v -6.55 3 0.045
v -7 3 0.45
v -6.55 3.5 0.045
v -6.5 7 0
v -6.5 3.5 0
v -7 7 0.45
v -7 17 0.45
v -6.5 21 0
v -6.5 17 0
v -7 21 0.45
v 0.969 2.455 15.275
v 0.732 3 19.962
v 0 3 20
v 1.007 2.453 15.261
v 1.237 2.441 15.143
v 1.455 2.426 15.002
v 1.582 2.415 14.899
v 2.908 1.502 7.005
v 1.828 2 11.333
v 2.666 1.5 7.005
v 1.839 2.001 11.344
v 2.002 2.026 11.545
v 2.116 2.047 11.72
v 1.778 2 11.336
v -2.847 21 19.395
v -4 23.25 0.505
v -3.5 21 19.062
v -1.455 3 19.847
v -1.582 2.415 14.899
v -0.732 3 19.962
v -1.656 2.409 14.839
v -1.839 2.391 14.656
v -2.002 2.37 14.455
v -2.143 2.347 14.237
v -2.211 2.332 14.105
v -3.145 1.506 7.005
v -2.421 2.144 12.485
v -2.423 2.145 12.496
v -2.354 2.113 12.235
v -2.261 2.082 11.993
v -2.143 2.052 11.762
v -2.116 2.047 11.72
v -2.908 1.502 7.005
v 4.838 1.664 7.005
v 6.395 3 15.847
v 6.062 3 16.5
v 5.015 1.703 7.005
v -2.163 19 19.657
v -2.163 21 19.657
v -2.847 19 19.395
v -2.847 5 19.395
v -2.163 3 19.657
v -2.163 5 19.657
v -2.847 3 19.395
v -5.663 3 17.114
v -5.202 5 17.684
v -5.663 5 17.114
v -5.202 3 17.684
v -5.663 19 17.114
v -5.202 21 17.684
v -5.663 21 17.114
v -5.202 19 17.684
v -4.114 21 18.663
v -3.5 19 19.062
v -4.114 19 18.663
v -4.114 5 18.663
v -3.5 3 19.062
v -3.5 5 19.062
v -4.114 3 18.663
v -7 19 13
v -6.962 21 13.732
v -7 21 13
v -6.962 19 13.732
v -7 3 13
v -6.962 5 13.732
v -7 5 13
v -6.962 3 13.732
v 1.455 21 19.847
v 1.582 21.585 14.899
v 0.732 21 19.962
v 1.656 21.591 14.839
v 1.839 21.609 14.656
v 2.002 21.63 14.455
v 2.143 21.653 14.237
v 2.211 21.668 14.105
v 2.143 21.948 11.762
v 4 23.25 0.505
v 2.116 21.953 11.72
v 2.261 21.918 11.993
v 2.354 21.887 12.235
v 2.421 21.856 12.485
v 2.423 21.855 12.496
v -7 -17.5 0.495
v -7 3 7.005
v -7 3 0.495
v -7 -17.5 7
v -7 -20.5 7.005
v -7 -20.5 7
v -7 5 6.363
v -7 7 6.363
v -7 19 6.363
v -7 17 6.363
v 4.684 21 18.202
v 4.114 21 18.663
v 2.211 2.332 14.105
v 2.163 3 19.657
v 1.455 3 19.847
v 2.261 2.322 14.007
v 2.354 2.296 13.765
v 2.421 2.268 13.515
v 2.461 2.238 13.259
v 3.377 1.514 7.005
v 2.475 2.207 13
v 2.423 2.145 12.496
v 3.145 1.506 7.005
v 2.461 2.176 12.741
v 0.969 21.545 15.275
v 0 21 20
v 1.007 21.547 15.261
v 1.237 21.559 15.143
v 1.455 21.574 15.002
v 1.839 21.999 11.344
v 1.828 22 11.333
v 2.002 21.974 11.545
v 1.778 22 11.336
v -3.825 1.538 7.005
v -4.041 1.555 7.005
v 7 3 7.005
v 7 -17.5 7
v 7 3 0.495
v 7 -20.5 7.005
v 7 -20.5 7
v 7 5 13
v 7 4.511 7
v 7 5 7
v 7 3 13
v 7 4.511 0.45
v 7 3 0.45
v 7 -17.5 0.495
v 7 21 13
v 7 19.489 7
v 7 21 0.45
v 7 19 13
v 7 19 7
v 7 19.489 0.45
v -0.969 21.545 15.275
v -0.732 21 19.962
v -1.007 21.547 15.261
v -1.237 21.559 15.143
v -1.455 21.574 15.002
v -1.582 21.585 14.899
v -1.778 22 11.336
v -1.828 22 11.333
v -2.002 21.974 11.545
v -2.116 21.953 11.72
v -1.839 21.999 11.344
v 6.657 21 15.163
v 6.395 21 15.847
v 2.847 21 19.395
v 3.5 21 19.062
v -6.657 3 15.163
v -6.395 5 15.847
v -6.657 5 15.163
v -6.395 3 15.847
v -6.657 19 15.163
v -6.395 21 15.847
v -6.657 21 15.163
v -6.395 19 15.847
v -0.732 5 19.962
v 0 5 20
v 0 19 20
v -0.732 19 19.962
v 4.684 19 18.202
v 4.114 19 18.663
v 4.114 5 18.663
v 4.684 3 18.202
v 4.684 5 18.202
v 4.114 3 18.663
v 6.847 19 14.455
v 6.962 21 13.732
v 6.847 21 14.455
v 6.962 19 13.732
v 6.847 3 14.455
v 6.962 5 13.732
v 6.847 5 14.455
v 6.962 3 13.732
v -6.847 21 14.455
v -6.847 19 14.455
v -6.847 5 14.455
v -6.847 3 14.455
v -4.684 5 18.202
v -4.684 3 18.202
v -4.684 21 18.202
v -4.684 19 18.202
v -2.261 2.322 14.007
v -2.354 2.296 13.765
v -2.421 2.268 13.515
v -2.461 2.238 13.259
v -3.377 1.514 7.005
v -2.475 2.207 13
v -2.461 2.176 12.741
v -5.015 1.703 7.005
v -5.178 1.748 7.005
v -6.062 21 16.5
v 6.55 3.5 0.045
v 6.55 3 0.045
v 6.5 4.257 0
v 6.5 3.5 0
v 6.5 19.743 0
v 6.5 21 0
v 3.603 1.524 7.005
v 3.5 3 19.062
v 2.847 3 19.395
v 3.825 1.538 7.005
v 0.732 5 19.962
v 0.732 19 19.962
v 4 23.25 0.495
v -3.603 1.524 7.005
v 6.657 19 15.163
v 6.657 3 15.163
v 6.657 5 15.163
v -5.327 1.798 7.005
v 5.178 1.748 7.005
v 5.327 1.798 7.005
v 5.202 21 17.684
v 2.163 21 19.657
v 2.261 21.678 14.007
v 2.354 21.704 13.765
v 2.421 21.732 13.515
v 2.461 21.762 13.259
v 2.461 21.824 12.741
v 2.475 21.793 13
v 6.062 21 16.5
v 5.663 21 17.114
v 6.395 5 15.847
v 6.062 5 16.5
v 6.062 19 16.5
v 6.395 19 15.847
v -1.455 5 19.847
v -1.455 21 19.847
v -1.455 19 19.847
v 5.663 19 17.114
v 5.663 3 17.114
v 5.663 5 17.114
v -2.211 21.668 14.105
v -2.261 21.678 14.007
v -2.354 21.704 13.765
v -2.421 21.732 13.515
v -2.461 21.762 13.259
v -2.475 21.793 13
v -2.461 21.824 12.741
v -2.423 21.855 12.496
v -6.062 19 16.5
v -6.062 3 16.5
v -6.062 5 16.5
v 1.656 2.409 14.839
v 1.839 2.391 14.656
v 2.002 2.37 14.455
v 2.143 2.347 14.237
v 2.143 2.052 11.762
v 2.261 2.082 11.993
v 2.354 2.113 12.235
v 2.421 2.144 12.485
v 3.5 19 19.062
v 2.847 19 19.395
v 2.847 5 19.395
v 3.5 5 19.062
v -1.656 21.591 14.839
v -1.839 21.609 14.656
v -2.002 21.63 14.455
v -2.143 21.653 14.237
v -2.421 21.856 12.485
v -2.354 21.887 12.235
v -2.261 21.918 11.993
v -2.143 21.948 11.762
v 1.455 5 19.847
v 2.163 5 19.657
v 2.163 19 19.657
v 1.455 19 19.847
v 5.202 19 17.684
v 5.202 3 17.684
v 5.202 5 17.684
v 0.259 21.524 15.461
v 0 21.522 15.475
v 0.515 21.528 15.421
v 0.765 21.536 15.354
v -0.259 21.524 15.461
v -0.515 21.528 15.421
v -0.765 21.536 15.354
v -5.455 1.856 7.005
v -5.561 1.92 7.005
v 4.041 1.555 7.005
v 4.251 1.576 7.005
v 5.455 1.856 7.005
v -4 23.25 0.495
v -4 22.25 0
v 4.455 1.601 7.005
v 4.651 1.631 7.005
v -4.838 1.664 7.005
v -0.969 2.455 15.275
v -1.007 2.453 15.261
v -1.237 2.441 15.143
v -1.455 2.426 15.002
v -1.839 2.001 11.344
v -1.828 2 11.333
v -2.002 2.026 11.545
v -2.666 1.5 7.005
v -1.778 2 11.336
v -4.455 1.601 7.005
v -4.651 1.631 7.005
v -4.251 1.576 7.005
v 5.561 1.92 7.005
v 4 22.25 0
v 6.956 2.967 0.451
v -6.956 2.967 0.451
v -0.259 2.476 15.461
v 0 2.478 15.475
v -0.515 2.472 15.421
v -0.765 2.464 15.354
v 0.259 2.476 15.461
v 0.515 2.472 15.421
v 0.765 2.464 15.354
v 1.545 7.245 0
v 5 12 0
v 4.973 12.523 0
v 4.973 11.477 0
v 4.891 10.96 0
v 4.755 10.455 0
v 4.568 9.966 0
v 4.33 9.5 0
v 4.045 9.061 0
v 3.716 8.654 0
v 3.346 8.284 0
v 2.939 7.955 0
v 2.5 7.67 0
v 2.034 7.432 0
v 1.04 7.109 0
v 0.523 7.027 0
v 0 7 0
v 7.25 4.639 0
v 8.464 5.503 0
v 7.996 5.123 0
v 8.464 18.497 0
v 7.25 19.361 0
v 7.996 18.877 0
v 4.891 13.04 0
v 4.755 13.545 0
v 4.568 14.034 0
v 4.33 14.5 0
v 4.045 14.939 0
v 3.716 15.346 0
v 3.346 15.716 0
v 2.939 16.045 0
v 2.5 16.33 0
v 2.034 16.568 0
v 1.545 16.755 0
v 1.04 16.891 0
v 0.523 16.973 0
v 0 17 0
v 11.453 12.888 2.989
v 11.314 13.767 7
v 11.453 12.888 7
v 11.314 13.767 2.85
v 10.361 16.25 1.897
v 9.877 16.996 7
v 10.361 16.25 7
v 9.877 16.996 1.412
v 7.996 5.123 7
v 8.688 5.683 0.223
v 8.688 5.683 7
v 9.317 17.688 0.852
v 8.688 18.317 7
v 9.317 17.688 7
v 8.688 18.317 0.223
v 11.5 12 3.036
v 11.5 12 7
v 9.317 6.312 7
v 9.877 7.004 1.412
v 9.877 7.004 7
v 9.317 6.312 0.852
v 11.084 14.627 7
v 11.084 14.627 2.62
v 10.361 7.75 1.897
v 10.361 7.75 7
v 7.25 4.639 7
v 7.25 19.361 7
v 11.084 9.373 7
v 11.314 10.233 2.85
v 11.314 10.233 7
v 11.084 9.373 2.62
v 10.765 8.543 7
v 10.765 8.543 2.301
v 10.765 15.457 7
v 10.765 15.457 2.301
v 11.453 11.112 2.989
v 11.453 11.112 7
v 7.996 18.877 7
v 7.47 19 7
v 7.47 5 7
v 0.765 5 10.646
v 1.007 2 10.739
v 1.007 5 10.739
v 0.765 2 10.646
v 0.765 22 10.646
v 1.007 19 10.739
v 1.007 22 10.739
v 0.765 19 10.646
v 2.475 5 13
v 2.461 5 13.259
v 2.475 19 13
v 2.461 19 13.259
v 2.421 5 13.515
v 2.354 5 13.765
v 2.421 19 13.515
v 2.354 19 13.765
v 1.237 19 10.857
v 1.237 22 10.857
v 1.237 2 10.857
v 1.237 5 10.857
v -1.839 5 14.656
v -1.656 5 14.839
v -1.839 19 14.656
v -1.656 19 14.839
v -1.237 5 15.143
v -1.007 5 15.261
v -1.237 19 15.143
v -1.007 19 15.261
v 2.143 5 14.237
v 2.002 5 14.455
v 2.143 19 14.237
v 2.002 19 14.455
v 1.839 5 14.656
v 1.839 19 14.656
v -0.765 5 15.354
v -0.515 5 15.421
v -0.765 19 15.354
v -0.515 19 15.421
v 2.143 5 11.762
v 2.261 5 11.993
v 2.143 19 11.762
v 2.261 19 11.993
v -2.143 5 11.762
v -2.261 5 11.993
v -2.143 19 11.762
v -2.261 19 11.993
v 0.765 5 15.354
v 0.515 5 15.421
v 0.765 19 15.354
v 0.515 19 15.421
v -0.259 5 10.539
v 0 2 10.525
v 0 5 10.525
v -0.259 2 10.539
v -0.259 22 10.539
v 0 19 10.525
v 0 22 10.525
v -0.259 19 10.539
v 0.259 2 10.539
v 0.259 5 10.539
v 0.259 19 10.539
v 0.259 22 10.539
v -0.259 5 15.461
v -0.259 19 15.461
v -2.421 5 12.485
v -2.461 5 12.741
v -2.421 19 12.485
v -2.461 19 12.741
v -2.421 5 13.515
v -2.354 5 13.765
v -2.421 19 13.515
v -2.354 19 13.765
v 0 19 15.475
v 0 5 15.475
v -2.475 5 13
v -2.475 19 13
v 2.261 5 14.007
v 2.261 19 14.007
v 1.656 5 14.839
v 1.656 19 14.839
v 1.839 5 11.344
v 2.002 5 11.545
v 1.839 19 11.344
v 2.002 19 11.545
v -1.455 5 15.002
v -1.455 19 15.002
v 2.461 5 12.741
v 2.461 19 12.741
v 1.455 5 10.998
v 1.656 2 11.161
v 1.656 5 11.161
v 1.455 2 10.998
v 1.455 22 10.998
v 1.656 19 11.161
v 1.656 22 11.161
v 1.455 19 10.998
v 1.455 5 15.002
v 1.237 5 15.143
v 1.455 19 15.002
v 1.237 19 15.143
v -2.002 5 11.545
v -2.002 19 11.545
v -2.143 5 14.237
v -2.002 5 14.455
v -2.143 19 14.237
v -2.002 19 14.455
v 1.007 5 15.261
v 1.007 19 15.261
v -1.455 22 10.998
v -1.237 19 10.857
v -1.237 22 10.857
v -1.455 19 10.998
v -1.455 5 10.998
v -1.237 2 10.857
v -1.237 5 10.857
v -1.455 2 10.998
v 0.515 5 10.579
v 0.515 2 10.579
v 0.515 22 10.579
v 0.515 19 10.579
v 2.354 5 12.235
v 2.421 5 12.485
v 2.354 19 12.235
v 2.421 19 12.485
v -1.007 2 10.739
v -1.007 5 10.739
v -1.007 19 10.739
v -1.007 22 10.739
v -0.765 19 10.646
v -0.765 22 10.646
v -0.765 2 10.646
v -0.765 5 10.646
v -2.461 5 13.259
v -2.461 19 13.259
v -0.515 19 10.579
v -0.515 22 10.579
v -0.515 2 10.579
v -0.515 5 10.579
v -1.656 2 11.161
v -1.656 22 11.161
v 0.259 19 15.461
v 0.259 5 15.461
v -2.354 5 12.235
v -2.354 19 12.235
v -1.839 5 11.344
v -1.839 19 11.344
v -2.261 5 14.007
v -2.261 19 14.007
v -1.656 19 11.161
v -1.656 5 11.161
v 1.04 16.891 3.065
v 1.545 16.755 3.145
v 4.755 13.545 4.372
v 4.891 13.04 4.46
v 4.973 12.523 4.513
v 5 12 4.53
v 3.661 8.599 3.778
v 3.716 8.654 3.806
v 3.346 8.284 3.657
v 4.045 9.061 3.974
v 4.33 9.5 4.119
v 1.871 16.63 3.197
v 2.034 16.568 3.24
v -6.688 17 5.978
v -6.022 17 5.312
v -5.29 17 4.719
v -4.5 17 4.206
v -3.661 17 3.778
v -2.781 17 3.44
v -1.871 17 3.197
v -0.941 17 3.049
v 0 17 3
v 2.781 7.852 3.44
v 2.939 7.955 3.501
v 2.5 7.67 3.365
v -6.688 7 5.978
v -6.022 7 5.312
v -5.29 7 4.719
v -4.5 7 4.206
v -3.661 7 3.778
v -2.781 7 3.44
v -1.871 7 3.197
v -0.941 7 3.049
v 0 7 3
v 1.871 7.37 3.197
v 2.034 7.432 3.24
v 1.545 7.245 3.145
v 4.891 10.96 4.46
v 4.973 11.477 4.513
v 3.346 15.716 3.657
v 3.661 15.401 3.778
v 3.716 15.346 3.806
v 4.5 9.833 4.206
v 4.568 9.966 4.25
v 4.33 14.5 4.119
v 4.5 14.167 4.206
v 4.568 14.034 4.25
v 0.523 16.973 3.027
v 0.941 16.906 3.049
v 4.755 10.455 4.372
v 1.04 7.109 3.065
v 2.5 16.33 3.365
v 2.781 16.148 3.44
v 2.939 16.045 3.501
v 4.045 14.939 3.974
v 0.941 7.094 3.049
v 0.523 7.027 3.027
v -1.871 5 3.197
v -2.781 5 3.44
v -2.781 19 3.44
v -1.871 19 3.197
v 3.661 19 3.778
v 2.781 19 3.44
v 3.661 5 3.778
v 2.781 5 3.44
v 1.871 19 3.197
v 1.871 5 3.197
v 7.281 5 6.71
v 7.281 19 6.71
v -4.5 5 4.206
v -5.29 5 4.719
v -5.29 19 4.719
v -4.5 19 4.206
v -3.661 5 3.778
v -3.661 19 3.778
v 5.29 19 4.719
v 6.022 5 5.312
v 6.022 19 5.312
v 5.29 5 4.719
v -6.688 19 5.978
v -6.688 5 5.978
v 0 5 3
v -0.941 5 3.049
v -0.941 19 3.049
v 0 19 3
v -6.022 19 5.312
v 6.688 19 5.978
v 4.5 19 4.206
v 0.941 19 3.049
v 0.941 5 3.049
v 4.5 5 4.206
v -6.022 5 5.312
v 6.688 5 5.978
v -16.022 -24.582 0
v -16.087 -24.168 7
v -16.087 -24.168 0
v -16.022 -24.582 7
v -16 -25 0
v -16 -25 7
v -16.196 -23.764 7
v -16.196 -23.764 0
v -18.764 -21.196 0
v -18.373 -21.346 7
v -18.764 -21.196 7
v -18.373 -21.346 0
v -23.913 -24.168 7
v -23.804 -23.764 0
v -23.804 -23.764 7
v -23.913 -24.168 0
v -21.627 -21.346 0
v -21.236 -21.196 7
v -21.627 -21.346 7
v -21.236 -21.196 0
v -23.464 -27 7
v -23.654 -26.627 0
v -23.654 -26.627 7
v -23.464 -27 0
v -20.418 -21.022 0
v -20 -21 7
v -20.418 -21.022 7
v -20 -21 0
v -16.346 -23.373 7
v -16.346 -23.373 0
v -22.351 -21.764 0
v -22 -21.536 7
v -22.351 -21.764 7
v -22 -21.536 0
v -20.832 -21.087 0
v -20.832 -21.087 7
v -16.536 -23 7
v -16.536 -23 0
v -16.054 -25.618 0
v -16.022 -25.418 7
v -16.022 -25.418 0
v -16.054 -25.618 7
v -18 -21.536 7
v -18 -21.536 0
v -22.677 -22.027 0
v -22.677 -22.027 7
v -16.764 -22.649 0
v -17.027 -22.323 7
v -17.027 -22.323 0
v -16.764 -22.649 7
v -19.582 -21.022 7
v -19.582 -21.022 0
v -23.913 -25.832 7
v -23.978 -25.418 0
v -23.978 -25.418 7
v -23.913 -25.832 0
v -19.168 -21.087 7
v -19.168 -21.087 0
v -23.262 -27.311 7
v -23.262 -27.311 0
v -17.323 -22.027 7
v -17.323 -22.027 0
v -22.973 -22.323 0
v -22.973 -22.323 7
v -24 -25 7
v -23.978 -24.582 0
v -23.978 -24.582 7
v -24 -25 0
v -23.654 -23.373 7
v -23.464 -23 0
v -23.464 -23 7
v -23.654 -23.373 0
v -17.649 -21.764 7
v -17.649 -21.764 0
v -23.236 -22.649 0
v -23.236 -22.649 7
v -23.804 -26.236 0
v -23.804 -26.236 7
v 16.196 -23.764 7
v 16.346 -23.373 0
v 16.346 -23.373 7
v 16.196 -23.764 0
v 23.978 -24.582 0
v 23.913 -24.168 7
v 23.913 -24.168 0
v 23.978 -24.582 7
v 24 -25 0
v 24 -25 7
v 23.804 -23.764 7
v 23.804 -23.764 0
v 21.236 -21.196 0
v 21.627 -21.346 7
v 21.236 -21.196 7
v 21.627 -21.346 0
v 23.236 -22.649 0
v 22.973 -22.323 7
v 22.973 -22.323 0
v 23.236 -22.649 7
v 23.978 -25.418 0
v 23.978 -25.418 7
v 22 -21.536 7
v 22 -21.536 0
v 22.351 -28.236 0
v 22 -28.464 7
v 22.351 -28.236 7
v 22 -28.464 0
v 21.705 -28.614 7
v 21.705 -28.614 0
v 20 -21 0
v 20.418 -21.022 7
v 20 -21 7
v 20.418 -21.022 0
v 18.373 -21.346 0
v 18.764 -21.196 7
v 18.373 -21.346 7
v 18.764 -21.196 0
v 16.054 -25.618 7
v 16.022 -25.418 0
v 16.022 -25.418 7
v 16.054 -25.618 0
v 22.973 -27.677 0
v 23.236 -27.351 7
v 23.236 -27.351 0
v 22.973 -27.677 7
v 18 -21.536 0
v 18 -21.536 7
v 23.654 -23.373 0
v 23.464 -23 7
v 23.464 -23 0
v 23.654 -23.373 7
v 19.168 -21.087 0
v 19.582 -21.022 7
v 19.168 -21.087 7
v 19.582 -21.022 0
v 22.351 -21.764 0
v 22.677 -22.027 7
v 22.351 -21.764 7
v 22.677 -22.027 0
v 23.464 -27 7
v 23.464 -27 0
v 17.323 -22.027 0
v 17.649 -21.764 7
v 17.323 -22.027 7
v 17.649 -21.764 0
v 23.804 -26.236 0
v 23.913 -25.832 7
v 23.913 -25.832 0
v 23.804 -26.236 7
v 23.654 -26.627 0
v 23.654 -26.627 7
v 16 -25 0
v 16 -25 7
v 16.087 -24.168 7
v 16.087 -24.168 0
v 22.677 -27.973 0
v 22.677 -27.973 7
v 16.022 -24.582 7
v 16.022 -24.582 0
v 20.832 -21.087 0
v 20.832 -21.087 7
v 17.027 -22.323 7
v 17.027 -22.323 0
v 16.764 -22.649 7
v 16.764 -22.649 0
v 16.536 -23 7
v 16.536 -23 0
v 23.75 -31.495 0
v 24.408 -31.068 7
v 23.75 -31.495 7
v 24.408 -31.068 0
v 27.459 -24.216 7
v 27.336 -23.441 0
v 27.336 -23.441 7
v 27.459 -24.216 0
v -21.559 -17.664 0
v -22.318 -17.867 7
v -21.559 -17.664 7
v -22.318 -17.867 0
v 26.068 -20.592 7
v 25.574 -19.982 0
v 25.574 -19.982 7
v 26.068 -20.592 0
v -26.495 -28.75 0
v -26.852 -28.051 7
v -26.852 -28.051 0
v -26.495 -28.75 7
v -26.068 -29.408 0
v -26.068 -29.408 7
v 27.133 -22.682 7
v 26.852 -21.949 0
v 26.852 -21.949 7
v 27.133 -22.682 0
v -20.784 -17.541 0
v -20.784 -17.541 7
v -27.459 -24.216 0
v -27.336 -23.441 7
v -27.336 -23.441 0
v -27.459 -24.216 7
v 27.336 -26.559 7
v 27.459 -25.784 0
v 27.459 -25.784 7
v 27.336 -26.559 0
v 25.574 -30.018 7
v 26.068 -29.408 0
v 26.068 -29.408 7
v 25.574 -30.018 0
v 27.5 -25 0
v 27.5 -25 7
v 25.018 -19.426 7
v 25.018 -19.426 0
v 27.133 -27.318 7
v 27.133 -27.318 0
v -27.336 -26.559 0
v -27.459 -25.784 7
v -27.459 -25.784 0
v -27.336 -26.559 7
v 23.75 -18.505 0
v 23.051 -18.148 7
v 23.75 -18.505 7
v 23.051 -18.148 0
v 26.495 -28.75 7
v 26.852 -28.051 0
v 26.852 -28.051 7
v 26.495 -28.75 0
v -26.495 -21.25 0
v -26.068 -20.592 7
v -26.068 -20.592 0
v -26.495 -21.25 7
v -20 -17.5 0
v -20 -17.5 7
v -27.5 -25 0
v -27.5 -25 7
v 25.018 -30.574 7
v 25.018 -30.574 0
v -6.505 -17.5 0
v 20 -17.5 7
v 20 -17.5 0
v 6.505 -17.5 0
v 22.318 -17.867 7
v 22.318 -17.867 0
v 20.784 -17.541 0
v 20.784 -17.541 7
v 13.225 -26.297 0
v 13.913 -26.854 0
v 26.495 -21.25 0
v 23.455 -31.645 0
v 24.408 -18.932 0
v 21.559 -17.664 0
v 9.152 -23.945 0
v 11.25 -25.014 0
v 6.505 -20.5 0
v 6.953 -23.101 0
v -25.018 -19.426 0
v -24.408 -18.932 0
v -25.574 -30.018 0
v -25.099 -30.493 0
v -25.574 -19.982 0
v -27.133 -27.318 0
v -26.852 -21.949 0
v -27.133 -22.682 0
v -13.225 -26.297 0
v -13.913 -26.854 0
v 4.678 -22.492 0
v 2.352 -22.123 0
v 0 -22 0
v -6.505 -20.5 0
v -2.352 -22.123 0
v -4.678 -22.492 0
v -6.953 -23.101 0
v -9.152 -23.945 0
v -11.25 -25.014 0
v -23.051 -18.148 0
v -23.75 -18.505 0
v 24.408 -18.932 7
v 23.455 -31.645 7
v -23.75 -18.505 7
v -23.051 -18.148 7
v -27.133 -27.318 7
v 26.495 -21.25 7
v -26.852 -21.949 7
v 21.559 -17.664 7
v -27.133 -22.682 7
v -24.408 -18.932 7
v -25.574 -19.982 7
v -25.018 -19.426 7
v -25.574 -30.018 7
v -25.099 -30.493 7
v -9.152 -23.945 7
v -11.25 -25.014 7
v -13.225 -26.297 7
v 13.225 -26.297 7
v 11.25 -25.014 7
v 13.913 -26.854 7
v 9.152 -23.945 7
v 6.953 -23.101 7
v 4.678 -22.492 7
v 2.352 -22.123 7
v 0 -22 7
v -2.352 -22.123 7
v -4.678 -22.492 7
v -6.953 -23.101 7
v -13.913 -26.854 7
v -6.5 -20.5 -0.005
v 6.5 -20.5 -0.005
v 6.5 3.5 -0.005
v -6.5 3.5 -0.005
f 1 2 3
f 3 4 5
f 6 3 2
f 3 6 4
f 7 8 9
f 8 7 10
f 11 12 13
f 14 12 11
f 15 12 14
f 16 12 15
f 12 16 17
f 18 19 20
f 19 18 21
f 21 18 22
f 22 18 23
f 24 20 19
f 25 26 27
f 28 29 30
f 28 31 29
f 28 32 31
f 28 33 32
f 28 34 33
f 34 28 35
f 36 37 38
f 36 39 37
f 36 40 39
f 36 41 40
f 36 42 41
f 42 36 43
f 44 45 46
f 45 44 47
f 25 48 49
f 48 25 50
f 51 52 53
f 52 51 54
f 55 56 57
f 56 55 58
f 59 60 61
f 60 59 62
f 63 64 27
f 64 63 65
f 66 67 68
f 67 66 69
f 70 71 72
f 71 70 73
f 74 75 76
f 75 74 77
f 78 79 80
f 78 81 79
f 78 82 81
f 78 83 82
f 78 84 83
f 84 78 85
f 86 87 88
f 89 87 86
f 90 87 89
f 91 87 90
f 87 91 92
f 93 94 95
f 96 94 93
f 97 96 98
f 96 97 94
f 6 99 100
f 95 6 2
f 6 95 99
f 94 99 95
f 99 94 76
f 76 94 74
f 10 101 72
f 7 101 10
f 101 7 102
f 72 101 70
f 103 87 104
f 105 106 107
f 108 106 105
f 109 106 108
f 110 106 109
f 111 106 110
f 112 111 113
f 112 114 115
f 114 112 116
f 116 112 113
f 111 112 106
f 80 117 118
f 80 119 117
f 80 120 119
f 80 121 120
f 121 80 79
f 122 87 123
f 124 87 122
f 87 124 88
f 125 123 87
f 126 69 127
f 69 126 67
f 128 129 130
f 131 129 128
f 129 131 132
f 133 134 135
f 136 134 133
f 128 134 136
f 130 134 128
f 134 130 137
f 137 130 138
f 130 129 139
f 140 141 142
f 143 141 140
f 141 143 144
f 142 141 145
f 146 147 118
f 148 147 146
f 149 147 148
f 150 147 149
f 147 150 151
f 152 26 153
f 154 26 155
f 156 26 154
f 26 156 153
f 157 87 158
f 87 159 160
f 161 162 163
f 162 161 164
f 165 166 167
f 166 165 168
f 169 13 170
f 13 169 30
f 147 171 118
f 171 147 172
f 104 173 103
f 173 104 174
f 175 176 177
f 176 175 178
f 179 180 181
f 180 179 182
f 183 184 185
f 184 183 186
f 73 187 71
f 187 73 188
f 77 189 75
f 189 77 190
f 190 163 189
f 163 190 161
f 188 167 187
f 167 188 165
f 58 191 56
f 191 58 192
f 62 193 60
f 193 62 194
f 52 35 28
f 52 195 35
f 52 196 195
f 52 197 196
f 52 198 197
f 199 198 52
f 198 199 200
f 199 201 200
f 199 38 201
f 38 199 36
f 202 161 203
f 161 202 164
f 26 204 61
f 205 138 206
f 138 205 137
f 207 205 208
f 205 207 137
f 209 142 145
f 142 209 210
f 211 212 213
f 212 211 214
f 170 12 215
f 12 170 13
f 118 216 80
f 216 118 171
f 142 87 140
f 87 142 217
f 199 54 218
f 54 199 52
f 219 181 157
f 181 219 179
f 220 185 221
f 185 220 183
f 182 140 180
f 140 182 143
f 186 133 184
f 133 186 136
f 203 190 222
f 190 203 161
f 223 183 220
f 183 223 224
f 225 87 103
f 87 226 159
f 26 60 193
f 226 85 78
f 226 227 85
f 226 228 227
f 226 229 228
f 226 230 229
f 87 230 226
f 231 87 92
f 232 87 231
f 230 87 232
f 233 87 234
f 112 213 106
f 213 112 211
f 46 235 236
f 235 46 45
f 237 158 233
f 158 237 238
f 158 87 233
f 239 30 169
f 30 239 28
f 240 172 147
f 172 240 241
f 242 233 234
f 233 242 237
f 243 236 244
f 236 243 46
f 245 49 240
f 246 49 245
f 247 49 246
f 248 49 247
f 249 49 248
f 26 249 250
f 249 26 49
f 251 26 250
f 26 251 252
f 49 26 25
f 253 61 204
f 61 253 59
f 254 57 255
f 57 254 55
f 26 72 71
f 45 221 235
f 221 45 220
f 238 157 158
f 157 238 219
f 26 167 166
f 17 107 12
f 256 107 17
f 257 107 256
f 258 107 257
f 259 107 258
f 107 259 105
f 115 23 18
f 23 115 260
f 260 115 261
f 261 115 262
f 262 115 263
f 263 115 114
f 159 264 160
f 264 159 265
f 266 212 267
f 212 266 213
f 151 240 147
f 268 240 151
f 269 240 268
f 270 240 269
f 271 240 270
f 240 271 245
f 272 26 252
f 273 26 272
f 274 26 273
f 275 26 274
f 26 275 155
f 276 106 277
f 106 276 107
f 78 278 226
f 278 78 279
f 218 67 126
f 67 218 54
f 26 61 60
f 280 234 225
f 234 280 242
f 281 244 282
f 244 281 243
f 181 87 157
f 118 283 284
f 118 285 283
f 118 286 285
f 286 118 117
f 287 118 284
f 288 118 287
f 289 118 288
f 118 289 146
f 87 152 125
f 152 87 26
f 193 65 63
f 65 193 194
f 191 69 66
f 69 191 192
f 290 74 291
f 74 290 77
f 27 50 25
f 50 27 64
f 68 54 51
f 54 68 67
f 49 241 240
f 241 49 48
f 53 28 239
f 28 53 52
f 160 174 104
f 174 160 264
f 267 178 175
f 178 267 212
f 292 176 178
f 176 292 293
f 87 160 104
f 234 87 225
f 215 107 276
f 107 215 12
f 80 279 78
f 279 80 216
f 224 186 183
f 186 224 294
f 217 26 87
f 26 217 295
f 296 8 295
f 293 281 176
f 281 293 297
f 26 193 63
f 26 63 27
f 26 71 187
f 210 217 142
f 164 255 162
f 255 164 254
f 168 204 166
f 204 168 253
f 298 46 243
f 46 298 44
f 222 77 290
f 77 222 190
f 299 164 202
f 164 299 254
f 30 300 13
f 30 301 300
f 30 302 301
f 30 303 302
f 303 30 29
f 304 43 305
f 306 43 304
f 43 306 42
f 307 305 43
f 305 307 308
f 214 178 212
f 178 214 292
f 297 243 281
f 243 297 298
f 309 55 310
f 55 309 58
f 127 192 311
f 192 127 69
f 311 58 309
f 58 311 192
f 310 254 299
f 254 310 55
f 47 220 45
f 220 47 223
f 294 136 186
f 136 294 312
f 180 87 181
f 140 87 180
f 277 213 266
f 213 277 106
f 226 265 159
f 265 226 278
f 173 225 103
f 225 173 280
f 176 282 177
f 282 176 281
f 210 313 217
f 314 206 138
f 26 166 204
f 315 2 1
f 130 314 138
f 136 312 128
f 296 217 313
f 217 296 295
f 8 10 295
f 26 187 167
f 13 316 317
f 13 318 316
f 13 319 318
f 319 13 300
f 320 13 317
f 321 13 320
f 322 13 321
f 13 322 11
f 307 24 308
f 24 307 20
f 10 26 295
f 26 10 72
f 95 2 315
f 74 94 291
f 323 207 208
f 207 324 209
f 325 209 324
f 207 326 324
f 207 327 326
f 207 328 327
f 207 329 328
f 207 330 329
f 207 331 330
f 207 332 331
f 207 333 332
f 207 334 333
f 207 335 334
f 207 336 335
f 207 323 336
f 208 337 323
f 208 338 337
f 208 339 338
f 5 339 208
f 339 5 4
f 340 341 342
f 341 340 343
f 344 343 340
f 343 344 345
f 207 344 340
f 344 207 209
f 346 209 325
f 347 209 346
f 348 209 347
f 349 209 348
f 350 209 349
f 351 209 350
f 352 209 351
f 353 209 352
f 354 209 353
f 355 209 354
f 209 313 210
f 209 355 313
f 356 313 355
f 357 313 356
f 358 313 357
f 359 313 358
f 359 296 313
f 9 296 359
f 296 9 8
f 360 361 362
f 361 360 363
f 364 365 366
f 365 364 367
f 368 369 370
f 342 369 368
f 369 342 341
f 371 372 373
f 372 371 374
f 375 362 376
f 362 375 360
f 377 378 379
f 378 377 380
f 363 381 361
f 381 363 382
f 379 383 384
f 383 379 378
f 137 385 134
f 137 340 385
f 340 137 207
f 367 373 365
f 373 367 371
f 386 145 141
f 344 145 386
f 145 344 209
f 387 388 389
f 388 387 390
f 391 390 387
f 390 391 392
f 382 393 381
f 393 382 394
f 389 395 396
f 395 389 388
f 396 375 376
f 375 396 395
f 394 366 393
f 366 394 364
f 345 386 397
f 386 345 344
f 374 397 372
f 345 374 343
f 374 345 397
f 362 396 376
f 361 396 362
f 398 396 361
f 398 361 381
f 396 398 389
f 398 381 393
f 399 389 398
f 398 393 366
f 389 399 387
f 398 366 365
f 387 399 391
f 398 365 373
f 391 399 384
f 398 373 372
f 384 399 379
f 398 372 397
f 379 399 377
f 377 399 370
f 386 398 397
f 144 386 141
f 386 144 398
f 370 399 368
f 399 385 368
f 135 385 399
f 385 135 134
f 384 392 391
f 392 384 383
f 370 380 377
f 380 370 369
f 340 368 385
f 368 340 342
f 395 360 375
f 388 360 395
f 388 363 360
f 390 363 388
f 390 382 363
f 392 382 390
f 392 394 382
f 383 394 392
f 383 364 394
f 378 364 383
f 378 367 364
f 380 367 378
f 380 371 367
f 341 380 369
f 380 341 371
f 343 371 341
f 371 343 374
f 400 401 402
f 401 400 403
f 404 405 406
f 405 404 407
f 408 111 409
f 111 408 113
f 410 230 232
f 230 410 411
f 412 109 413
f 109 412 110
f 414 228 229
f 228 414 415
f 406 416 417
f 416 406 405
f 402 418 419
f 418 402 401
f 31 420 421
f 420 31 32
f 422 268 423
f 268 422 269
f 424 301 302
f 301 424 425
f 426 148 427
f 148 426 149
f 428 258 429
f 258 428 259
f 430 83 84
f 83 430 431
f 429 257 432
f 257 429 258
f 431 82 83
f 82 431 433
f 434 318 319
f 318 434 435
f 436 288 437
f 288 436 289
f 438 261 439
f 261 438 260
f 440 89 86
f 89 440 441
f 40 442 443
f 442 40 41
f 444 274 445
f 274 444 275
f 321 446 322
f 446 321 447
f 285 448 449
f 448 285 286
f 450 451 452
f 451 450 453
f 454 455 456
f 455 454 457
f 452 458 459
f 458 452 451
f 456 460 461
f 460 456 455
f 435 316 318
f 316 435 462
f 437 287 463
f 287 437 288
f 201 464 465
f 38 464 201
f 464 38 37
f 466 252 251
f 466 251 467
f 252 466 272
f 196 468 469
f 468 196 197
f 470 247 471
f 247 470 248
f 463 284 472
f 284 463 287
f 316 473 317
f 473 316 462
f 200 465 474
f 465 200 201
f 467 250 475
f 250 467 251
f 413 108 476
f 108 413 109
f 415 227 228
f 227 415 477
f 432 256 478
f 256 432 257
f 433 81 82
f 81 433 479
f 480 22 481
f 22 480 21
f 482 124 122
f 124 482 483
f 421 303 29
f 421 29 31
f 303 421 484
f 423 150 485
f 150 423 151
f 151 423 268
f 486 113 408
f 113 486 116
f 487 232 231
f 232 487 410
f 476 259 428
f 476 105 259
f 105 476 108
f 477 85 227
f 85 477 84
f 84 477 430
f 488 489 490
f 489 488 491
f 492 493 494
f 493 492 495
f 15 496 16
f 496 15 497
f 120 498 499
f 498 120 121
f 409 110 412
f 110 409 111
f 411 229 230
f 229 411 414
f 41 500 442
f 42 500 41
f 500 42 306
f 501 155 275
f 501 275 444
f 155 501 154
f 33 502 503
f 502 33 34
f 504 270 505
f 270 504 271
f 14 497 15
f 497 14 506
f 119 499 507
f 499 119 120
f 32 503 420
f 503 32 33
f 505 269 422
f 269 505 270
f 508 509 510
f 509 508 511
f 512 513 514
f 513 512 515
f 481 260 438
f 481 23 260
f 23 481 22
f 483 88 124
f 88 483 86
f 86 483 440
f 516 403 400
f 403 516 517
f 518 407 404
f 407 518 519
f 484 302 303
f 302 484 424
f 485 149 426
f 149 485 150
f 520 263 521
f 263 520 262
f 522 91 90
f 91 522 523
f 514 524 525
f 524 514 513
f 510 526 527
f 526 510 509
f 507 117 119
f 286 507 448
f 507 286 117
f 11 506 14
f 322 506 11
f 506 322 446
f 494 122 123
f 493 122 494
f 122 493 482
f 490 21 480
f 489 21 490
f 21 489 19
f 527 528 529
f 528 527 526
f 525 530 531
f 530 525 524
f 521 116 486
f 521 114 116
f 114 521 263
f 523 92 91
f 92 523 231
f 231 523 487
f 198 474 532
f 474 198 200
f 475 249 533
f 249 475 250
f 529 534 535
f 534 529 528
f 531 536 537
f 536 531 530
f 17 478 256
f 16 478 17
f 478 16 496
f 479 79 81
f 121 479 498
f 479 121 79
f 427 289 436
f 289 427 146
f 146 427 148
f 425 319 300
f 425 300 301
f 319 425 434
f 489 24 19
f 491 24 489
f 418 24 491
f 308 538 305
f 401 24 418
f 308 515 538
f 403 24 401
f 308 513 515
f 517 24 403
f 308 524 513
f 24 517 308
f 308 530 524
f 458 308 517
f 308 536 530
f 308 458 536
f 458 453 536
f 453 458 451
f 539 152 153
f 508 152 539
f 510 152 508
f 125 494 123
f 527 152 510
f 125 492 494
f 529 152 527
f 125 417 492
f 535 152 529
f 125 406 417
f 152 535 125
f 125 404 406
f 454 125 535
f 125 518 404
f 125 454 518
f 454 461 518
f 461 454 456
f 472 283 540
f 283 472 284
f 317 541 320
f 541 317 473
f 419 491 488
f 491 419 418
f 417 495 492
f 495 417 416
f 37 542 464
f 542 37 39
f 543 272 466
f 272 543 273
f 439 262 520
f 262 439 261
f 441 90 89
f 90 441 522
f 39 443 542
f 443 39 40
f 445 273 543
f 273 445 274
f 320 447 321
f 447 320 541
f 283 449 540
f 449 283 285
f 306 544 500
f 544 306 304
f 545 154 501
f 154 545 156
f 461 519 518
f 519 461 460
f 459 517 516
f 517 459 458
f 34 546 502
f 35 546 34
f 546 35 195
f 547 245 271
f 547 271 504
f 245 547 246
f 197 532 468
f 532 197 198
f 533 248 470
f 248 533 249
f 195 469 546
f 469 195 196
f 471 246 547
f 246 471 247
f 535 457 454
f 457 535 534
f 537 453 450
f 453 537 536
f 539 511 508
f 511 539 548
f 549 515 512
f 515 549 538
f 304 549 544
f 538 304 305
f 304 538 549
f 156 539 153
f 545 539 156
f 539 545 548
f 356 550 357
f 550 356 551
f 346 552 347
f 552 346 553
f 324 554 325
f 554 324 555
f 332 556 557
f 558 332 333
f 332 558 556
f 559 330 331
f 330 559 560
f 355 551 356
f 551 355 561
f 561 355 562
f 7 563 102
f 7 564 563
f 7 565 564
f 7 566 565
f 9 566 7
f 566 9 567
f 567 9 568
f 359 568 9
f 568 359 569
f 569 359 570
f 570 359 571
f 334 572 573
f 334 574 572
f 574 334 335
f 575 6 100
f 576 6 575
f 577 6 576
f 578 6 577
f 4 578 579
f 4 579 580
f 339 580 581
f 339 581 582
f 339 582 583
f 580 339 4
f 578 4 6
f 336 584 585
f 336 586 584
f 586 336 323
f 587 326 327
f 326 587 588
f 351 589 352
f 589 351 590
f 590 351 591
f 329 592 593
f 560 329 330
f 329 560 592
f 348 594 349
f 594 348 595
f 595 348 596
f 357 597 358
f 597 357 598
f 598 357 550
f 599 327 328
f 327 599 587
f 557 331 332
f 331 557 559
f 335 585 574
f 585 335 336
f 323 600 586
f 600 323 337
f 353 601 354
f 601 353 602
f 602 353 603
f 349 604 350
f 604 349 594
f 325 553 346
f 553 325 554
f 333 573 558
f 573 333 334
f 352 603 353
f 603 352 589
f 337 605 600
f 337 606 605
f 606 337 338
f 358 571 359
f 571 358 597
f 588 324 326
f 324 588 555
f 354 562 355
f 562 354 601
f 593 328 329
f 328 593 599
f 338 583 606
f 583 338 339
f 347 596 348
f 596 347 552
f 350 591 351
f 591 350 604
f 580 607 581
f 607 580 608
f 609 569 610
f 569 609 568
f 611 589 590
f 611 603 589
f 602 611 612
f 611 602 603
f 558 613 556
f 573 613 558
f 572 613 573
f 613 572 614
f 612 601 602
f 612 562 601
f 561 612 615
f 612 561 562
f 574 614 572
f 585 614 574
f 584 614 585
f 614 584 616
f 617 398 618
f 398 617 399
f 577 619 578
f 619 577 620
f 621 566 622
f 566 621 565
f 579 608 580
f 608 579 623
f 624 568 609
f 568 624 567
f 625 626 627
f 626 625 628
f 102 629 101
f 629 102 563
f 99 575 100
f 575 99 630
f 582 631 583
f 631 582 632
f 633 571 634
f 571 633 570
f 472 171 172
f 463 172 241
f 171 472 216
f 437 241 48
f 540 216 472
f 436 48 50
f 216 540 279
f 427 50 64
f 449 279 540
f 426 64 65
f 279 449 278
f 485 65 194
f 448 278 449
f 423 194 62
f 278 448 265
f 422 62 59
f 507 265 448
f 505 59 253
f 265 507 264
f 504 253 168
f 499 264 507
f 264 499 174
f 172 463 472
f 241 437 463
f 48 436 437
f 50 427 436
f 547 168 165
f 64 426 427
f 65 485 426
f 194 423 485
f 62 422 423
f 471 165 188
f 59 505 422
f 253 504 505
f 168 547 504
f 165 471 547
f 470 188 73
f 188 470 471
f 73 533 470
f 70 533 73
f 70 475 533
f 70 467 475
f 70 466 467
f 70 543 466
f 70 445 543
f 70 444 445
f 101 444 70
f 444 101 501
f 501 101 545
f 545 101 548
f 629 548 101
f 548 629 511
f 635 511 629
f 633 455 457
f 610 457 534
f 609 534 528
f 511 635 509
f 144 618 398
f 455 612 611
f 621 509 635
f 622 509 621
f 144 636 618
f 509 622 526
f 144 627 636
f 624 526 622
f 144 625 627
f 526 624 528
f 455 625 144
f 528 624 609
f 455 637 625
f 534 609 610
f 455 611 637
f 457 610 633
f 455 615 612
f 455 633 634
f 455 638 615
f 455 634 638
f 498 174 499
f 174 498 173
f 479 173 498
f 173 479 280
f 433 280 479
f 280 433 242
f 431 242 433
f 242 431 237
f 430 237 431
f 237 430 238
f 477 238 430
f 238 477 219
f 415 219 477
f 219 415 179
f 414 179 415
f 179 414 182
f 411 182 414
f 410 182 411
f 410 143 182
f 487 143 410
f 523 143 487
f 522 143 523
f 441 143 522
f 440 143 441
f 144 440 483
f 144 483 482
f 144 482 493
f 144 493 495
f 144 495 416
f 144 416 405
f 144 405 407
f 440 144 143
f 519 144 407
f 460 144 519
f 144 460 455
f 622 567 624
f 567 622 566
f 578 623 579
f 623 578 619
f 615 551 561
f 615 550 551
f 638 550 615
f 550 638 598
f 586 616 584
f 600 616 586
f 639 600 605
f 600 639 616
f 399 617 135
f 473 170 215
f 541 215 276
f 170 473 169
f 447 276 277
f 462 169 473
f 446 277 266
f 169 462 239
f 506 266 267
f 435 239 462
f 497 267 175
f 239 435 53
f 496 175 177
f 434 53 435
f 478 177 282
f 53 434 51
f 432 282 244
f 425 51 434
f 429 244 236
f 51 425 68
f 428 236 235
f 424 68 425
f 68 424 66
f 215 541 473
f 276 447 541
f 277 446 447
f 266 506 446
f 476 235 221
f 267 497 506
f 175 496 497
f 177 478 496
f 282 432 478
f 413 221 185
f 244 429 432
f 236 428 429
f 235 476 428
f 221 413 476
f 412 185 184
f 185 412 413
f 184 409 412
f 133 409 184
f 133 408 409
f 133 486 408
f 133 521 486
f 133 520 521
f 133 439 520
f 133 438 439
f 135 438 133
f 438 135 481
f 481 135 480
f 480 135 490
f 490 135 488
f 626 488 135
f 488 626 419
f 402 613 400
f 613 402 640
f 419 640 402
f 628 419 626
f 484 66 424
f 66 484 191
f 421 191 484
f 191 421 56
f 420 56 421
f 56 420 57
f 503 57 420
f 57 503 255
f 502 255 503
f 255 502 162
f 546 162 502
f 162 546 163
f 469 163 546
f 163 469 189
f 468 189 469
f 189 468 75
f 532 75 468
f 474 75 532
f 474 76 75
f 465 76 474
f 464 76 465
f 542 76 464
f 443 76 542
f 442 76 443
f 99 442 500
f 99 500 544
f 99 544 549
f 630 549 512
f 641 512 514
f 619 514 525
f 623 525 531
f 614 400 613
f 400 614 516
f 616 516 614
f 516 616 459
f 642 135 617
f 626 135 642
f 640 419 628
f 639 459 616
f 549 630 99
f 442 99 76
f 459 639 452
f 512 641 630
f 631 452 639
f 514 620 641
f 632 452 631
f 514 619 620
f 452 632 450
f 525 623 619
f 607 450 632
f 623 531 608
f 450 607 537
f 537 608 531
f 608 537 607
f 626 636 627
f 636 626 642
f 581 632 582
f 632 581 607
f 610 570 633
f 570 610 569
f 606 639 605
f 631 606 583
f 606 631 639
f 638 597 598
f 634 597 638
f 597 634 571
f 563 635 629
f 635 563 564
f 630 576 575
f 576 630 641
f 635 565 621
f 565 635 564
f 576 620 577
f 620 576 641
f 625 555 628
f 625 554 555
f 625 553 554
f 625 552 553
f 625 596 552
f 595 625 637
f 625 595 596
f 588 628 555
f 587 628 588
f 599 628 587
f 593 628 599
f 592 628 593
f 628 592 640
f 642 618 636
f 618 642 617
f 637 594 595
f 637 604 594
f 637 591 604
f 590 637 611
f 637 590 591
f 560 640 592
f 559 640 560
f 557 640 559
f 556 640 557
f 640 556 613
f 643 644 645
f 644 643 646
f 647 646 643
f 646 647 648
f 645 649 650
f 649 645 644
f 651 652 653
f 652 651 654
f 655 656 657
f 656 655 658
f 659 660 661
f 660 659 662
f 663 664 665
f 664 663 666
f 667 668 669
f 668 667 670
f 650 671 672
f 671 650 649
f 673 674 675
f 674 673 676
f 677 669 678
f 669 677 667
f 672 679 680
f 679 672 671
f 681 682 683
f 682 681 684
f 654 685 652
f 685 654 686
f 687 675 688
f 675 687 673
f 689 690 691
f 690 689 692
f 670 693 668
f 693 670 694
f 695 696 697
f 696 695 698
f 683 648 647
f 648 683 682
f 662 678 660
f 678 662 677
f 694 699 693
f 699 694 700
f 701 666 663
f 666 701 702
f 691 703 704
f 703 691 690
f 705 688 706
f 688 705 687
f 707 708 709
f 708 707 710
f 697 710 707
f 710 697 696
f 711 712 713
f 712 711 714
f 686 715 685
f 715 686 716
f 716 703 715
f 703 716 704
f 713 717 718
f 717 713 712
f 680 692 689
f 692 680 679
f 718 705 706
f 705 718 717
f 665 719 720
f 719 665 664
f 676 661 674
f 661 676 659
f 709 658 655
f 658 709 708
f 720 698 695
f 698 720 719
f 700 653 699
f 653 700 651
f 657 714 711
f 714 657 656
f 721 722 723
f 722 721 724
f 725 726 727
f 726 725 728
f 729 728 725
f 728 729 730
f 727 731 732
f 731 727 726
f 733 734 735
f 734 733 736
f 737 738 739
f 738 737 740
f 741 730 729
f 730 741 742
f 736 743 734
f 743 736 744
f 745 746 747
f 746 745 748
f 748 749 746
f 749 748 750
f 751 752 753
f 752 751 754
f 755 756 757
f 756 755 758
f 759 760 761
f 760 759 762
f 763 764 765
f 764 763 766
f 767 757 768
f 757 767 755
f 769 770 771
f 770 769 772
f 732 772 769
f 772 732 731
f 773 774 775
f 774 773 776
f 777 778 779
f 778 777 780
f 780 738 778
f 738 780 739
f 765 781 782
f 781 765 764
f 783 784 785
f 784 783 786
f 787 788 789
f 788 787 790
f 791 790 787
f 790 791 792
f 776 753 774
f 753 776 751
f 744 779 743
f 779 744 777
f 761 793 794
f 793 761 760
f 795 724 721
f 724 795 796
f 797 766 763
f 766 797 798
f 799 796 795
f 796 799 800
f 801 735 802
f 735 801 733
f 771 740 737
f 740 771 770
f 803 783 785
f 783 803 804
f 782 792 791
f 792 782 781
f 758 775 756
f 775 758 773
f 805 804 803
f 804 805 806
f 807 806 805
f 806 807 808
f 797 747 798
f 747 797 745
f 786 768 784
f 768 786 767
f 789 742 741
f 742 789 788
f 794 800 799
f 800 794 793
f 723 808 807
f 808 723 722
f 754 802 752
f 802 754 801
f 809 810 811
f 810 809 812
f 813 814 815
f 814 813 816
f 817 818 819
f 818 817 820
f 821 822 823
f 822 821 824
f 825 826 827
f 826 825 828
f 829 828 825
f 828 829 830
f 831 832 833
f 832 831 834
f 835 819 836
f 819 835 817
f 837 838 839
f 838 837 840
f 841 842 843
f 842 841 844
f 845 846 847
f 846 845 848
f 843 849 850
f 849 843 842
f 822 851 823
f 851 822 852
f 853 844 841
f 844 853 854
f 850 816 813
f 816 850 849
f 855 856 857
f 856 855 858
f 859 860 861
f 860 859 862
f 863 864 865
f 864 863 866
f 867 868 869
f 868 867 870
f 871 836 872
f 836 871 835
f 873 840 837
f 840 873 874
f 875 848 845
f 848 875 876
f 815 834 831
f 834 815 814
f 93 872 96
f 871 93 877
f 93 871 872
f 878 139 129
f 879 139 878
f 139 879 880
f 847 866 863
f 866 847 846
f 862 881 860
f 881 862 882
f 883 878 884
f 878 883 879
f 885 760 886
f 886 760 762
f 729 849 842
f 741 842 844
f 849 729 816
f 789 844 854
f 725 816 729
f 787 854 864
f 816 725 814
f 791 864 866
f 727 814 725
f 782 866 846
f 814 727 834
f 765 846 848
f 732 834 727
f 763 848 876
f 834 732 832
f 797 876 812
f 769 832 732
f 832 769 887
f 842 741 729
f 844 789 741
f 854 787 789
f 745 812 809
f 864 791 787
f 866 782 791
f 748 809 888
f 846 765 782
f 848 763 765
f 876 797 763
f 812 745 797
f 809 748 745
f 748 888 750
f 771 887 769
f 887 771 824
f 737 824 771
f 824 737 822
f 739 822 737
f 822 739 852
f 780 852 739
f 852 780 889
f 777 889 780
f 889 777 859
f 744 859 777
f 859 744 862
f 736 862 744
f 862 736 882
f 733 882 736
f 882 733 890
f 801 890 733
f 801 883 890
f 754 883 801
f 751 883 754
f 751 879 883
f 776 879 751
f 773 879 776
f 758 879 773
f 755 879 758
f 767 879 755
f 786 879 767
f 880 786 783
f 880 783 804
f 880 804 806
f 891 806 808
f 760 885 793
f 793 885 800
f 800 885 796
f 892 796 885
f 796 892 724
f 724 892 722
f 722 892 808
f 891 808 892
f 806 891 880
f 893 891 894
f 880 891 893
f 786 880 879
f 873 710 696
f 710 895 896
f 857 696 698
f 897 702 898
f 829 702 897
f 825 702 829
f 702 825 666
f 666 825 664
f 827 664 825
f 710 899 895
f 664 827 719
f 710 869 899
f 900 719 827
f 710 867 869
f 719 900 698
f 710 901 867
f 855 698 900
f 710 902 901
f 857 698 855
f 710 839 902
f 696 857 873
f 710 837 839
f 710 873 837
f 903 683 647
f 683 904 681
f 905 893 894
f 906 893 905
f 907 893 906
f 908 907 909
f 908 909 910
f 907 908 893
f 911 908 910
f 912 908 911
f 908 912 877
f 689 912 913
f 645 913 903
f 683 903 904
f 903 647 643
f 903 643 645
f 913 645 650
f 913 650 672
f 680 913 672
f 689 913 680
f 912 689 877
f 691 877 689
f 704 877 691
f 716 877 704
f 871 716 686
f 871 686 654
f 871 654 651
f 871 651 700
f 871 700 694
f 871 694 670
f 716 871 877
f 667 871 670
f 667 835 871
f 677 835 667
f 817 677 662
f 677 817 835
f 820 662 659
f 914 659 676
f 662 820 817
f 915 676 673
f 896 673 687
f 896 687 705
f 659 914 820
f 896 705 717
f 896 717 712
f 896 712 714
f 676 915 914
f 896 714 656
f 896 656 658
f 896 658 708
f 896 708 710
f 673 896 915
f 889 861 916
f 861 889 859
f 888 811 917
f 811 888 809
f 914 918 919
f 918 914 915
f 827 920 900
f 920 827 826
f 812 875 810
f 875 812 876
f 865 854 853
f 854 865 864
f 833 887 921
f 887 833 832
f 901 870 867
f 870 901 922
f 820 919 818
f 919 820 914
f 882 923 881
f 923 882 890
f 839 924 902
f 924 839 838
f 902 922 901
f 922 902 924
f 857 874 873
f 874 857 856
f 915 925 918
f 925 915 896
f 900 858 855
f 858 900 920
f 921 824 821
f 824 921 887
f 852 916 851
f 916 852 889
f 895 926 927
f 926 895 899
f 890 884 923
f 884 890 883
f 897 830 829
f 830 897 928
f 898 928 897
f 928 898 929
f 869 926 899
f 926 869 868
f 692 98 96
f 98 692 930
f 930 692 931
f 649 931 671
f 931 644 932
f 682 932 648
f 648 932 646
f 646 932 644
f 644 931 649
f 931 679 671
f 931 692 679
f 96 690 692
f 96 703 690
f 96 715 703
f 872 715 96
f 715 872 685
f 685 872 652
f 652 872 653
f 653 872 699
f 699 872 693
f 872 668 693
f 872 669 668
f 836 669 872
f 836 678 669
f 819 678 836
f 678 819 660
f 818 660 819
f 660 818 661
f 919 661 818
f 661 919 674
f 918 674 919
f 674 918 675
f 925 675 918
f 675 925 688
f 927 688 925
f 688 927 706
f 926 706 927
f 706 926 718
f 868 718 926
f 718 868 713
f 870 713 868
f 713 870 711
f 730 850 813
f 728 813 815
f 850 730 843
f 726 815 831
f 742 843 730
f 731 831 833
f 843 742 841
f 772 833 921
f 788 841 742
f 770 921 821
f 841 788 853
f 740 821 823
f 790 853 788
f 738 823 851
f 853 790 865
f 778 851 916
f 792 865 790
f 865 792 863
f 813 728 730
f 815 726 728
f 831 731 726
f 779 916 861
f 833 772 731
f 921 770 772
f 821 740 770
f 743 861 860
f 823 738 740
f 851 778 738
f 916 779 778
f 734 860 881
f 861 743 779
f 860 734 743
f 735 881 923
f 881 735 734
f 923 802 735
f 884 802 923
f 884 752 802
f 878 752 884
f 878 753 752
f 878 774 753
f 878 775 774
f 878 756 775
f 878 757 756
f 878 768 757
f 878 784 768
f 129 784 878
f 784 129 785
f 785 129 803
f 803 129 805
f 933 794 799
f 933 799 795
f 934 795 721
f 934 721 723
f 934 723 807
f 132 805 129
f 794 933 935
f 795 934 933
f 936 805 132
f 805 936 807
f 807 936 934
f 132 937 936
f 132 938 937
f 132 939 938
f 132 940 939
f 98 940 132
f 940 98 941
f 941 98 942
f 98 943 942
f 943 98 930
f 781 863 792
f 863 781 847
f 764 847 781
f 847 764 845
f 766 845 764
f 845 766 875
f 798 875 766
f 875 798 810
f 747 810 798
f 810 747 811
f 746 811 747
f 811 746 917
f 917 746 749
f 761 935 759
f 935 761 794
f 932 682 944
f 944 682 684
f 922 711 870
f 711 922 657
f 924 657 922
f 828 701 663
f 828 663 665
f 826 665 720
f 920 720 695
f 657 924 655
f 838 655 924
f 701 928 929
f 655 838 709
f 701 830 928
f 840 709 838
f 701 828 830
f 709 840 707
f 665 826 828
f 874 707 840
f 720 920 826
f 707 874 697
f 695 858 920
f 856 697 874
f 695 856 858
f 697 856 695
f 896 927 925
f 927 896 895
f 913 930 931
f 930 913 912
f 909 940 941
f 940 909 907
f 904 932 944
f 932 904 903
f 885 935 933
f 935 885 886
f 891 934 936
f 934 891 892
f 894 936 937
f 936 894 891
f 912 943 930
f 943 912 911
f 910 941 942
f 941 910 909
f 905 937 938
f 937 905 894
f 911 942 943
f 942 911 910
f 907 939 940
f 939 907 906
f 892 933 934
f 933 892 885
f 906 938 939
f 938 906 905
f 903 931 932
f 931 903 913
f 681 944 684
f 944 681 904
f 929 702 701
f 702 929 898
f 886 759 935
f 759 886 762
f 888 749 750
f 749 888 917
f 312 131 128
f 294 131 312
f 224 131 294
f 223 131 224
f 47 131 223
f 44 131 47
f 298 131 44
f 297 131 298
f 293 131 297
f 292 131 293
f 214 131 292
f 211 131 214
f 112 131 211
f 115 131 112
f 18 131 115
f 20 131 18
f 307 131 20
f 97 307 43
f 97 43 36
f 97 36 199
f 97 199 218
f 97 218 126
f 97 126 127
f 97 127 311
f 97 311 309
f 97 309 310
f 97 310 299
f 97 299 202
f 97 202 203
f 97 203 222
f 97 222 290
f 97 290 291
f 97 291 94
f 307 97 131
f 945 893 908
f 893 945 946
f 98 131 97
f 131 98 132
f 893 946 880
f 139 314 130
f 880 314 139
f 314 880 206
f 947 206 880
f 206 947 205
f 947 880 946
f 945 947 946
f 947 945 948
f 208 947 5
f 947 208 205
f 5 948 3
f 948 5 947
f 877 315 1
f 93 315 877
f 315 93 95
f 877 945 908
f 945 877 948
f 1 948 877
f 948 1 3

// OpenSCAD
//%translate([-4,2,0])
//import("../printer/Hot_end_chain_bracket.stl");

mount_dia=14;
moutside=14;
mhole=4.95;
m_offset=[0,10];
$fn=60;

difference(){
  translate([m_offset[0],m_offset[1]+2,13])
    union(){
      hull(){
        rotate([90,0,0]) cylinder(d=mount_dia,h=moutside+4,center=true);
        translate([0,0,-12.5]) 
          cube([mount_dia,moutside+4,0.1],center=true);
        translate([0,0,-12.5]) 
          cube([mount_dia-6,moutside+8.5,0.01],center=true);
        translate([0,0,-12.95]) 
          cube([mount_dia-6,moutside+6.5,0.1],center=true);
        translate([0,0,-12.95]) 
          cube([mount_dia-1,moutside+4,0.1],center=true);
      }
      translate([3,0,-13]) cylinder(d=17,h=7);
    }
  translate([m_offset[0]+12,m_offset[1]+2,0])
    rotate([0,-45,0]) cube([10,moutside+4,5],center=true);
  translate([m_offset[0],m_offset[1]+2,13])
    rotate([90,0,0]) cylinder(d=mhole,h=moutside+6,center=true,$fn=60);
  translate([m_offset[0],m_offset[1]+2,-2])
    hull(){
      cylinder(d=10,h=20);
      translate([-10,0,0]) cylinder(d=10,h=20);
    }
  translate([m_offset[0],m_offset[1]+2,12])
    rotate([90,0,0]) cylinder(d=18,h=moutside,center=true);
}
//  %hull(){
//    translate([m_offset[0],m_offset[1]-moutside/2,3.5]) 
//      cube([mount_dia,1,7],center=true);
//    translate([0,-20,3.5]) 
//      cube([mount_dia,1,7],center=true);
//  }
  hull(){
    // top
    translate([m_offset[0],m_offset[1]-moutside/2,7]) 
      cube([mount_dia,1,0.01],center=true);
    translate([0,-20,7]) 
      cube([mount_dia,1,0.01],center=true);
    // middle
    translate([m_offset[0],m_offset[1]-moutside/2,0.5]) 
      cube([mount_dia,1,0.01],center=true);
    translate([0,-20,0.5]) 
      cube([mount_dia,1,0.01],center=true);
    // bottom
    translate([m_offset[0],m_offset[1]-moutside/2,0]) 
      cube([mount_dia-1,1,0.01],center=true);
    translate([0,-20,0]) 
      cube([mount_dia-1,1,0.01],center=true);
  }

difference(){
  hull() for(X=[-1,1]) translate([20*X,-25,0])
    cylinder(d=15,h=7);
  for(X=[-1,1]) translate([20*X,-25,-1])
    cylinder(d=8,h=10);
  translate([0,-20-24.5,-1])
    cylinder(d=45,h=10);
  translate([-15,-32,4]) rotate([0,0,60])
  cube([10,19,10], center=true);
  translate([15,-32,4]) rotate([0,0,-60])
  cube([10,15,10], center=true);
}
